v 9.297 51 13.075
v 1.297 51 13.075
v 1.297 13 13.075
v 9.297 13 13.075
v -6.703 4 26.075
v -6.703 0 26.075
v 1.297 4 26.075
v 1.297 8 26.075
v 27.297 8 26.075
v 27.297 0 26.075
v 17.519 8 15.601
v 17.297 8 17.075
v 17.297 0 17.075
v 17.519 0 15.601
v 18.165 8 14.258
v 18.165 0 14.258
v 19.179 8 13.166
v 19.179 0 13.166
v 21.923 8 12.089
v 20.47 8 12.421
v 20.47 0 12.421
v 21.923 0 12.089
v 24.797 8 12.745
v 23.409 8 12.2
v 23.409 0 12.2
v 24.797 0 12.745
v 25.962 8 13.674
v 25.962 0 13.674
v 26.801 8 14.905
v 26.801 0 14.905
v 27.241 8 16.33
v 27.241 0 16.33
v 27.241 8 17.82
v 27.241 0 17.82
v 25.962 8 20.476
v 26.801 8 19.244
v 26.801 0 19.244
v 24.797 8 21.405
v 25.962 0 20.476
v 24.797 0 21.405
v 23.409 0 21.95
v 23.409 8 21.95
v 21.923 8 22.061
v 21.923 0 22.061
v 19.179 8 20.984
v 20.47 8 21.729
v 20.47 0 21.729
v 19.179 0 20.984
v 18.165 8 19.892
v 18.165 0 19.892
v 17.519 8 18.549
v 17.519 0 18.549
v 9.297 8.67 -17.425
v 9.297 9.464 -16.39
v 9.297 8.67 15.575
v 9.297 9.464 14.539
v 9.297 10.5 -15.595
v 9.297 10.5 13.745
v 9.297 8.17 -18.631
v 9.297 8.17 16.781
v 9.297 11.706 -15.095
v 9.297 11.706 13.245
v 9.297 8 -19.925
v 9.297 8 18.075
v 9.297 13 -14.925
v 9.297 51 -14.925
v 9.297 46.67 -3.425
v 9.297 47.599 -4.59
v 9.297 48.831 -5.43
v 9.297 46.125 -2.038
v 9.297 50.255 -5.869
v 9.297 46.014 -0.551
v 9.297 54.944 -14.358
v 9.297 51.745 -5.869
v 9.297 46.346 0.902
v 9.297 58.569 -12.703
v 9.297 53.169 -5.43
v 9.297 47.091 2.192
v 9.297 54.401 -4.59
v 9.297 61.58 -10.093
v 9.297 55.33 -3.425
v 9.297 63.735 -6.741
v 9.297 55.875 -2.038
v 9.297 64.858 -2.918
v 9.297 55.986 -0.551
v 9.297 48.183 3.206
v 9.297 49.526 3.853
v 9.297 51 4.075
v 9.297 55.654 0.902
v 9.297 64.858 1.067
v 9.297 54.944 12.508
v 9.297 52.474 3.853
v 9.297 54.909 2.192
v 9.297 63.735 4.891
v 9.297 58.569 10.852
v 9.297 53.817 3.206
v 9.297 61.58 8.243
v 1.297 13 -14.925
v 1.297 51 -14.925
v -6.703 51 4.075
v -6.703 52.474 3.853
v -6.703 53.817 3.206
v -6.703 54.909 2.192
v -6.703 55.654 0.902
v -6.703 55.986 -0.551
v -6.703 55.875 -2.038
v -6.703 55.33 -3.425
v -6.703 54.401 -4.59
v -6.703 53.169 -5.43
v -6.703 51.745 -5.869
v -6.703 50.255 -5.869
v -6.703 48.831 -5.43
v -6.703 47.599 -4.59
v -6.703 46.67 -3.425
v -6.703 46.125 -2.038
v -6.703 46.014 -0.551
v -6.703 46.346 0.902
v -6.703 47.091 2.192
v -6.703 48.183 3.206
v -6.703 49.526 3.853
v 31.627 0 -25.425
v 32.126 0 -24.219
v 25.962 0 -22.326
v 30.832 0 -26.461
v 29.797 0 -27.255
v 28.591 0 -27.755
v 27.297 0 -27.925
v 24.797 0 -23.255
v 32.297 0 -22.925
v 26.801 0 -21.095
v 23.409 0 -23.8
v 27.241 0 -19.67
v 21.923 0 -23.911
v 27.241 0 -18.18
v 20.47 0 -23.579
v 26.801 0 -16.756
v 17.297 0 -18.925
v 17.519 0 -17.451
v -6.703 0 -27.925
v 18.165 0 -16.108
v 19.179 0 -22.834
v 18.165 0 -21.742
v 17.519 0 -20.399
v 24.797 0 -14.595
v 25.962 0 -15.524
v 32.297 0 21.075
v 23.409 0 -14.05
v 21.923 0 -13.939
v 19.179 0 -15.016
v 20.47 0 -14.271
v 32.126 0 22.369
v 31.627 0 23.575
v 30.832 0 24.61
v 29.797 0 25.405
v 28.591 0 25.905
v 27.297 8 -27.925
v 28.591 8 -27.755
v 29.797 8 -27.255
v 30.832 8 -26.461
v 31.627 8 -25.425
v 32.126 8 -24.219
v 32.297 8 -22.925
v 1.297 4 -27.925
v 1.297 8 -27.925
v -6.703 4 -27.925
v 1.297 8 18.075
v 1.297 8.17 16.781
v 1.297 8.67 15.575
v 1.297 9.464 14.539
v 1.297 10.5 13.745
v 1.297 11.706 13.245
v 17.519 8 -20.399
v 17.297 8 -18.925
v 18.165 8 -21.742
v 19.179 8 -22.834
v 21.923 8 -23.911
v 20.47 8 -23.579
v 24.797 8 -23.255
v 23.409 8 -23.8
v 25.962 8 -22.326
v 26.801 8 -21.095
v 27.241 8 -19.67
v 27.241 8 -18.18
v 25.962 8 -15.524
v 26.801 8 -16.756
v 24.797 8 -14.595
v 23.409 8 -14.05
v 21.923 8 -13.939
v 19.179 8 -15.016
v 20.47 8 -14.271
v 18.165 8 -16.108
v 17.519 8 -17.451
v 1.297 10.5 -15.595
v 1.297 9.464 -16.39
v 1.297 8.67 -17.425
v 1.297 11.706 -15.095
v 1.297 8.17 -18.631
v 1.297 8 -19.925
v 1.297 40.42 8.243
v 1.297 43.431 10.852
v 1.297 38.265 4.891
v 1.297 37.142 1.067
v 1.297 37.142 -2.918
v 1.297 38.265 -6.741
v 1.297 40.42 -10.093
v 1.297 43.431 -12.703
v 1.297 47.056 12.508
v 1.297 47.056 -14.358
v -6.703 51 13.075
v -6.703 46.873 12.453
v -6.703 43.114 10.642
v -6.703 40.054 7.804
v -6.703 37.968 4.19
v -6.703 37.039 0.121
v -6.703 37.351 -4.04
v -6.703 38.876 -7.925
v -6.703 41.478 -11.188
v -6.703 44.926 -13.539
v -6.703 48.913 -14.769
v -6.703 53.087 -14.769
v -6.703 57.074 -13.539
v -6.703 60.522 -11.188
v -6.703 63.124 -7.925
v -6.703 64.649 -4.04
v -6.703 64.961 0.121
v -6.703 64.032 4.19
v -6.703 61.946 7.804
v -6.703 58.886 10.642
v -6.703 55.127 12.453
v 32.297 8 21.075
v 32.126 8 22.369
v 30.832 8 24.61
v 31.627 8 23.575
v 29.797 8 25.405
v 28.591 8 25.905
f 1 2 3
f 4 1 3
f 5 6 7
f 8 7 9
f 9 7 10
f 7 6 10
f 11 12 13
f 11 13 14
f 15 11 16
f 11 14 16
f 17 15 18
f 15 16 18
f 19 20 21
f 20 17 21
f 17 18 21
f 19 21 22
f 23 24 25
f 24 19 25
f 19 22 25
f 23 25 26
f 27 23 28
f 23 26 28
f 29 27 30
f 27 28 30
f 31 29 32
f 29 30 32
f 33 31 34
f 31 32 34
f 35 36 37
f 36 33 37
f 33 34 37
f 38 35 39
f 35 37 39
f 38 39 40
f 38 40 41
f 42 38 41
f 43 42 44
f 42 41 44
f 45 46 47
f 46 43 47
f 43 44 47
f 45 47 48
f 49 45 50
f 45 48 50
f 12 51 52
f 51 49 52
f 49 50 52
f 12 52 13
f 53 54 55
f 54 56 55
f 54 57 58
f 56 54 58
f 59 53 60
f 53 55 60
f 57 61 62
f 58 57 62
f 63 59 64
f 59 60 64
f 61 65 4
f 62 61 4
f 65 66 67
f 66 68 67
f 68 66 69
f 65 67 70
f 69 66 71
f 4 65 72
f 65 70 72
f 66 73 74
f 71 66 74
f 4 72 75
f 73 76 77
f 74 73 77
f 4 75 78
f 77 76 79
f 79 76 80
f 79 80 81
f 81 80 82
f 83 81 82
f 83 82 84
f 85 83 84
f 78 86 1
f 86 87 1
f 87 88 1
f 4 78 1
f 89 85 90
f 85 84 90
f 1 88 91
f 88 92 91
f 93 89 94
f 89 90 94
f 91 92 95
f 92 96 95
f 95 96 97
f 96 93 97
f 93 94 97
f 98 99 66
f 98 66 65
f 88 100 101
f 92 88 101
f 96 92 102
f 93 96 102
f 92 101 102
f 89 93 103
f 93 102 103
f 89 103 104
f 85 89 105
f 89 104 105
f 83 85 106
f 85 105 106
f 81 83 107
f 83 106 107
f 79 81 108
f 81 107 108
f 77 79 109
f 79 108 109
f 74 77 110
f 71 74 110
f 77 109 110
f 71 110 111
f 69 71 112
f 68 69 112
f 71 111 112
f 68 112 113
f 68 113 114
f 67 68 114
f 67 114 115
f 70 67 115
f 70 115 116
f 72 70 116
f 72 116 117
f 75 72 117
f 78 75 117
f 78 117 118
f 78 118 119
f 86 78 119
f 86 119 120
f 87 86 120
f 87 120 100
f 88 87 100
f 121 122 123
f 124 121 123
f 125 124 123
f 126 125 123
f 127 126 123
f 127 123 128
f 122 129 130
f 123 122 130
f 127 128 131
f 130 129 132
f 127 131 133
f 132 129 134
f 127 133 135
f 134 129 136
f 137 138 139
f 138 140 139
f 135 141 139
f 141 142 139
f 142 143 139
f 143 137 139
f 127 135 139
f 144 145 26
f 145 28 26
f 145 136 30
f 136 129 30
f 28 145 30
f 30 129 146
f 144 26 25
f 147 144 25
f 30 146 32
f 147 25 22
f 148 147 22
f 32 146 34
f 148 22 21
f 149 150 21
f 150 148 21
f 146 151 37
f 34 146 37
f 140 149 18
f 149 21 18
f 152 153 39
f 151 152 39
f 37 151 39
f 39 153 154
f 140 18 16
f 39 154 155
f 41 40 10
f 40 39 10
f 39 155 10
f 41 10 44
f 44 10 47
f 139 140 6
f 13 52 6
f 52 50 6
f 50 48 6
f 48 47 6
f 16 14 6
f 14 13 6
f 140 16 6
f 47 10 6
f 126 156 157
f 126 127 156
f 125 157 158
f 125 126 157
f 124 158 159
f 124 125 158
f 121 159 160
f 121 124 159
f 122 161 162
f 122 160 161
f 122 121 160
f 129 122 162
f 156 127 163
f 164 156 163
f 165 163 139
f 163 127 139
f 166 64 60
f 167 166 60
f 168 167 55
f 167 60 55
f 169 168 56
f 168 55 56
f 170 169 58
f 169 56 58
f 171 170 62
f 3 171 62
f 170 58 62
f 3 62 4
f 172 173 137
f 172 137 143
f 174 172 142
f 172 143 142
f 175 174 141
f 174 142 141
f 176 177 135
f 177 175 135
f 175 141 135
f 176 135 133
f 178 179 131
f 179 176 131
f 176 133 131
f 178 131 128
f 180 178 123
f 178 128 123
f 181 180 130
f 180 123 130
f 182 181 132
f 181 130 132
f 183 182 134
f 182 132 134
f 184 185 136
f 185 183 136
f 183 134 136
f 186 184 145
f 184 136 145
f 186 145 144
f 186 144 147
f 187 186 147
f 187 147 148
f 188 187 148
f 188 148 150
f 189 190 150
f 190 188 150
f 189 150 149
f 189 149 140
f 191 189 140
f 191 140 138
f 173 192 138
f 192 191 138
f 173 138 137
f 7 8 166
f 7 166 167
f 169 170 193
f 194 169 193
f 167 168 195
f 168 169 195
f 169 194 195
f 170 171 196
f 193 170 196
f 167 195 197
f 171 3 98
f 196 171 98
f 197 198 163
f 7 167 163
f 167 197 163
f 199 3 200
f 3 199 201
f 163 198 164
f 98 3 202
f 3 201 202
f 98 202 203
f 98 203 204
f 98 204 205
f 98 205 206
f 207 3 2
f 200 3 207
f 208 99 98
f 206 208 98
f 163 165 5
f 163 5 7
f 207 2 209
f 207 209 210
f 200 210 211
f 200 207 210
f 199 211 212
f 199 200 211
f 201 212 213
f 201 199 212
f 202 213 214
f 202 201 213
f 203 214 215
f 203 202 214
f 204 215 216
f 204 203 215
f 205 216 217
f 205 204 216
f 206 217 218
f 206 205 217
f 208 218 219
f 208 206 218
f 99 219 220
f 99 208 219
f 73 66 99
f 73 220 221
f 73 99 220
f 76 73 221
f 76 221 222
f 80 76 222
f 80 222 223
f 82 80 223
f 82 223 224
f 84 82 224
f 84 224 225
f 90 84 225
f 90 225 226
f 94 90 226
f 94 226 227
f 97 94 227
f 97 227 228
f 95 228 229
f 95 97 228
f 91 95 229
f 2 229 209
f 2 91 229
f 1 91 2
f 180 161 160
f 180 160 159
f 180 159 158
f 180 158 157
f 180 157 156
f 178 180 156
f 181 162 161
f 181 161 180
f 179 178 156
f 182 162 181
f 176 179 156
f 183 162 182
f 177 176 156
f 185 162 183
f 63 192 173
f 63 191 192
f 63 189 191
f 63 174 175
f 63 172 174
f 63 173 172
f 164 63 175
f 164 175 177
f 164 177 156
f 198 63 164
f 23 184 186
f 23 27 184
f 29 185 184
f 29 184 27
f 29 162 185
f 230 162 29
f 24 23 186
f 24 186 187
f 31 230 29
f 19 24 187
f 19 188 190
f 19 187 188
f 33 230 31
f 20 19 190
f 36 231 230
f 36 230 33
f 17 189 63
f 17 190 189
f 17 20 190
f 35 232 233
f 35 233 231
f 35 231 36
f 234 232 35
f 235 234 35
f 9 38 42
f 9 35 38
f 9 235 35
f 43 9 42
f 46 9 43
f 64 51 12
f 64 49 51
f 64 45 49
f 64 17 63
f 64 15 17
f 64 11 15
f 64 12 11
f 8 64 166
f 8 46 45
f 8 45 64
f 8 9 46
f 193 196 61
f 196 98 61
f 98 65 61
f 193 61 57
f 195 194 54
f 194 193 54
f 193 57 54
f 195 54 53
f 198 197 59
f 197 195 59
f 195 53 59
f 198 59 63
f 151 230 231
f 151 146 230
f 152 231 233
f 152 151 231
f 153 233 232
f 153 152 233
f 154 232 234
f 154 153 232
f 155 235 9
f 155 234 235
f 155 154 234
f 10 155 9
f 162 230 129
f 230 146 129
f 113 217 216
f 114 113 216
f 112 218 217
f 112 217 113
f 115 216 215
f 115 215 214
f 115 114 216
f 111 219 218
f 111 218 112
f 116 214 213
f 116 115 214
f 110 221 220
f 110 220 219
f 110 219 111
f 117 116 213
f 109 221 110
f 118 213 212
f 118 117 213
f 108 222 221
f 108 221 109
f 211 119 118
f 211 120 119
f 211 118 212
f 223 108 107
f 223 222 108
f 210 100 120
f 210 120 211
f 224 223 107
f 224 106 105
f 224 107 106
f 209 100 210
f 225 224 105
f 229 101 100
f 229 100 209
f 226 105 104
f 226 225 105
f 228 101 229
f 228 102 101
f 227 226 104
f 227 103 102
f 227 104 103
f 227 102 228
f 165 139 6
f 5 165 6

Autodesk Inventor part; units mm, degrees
ref_plane "YZ Plane" through (0, 0, 0) normal (1, 0, 0) x (0, 1, 0)
ref_plane "XZ Plane" through (0, 0, 0) normal (0, 1, 0) x (-1, 0, 0)
ref_plane "XY Plane" through (0, 0, 0) normal (0, 0, 1) x (1, 0, 0)
sketch "Sketch1" plane through (0, 0, 0) normal (0, 1, 0) x (-1, 0, 0)
  line L0 (6.7034, 26.0749) -> (-27.2966, 26.0749)
  line L1 (-32.2966, 21.0749) -> (-32.2966, -22.9251)
  line L2 (-27.2966, -27.9251) -> (6.7034, -27.9251)
  line L3 (6.7034, -27.9251) -> (6.7034, 26.0749)
  arc A0 (-27.2966, 26.0749) -> (-32.2966, 21.0749) centre (-27.2966, 21.0749) ccw
  arc A1 (-32.2966, -22.9251) -> (-27.2966, -27.9251) centre (-27.2966, -22.9251) ccw
  circle A2 centre (-22.2966, 17.0749) radius 5
  circle A3 centre (-22.2966, -18.9251) radius 5
  point P0 (0, 0)
  point P1 (-32.2966, -27.9251)
  point P2 (-32.2966, 26.0749)
  dimension "d0" = 39
  dimension "d1" = 54
  dimension "d2" = 5
  dimension "d3" = 5
  dimension "d5" = 10
  dimension "d6" = 9
  dimension "d8" = 10
  dimension "d9" = 9
extrude "Extrusion1" add sketch "Sketch1" along normal blind 8
sketch "Sketch2" plane through (0, 8, 0) normal (0, 1, 0) x (1, 0, 0)
  line L0 (-6.7034, 27.9251) -> (-6.7034, -26.0749) projected
  line L1 (-6.7034, -26.0749) -> (1.2966, -26.0749)
  line L2 (-6.7034, -26.0749) -> (27.2966, -26.0749) projected
  line L3 (1.2966, -26.0749) -> (1.2966, 27.9251)
  line L4 (1.2966, 27.9251) -> (-6.7034, 27.9251)
  line L5 (-6.7034, -26.0749) -> (-6.7034, 27.9251)
  point P0 (0, 0)
  dimension "d12" = 8
  dimension "d13" = 54
extrude "Extrusion2" cut sketch "Sketch2" against normal blind 4
ref_plane "Work Plane2" through (1.2966, 8, -27.9251) normal (-1, 0, 0) x (0, 0, 1)
sketch "Sketch3" plane through (1.2966, 8, -27.9251) normal (-1, 0, 0) x (0, 0, 1)
  line L0 (0, 0) -> (54, 0) projected
  circle A0 centre (27, 43) radius 5
  arc A1 (41, 43) -> (13, 43) centre (27, 43) ccw
  line L1 (13, 43) -> (13, 0)
  line L2 (4, 0) -> (14, 0) projected
  line L3 (41, 43) -> (41, 0)
  line L4 (13, 0) -> (41, 0)
  point P0 (27.9251, -8)
  point P1 (13, 0)
  dimension "d19" = 10
extrude "Extrusion3" add sketch "Sketch3" against normal blind 8
fillet "Fillet1" radius 5 1 edges at (5.2966, 8, -14.9251)
fillet "Fillet2" radius 5 1 edges at (5.2966, 8, 13.0749)
sketch "Sketch4" plane through (1.2966, 4, -27.9251) normal (-1, 0, 0) x (0, 0, 1)
  line L0 (0, 0) -> (0, 4) projected
  circle A0 centre (27, 47) radius 14
  point P0 (27.9251, -4)
extrude "Extrusion4" add sketch "Sketch4" along normal blind 8
sketch "Sketch5" plane through (-6.7034, 51, -0.9251) normal (-1, 0, 0) x (0, 0, 1)
  circle A0 centre (0, 0) radius 5
  point P0 (0.9251, -51)
  dimension "d29" = 10
extrude "Extrusion5" cut sketch "Sketch5" against normal blind 8
properties part number "4 - Part 1"
